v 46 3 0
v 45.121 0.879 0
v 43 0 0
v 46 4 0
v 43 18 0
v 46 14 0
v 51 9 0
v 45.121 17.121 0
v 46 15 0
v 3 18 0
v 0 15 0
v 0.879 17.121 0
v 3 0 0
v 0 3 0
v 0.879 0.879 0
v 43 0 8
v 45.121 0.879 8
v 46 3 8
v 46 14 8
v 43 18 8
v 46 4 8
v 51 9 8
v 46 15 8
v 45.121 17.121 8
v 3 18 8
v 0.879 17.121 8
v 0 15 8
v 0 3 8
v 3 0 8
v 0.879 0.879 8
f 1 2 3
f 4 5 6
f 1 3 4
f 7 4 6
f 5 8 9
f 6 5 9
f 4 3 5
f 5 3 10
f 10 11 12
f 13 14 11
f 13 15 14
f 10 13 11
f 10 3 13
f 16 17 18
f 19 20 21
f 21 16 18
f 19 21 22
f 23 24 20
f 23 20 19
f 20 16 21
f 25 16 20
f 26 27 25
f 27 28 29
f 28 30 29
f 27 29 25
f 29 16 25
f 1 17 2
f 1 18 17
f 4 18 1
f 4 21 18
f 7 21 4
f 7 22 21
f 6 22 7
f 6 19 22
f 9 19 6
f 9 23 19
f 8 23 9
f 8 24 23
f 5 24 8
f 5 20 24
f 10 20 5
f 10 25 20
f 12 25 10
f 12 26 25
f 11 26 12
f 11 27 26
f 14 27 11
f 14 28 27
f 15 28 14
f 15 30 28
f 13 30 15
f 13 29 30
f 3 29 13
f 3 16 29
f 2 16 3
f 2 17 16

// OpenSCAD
$fn = 32;

// ----------------------------------------------------------------------
// Ratchet pawl: 46 x 18 mm body, beak 5 mm с правого торца
// ----------------------------------------------------------------------

// --- parameters (mm) ---
profile_height = 8;       // extrusion height
profile_points = 15;      // points of the closed outline

profile = [[0, 3], [0.879, 0.879], [3, 0], [43, 0], [45.121, 0.879], [46, 3], [46, 4], [51, 9], [46, 14], [46, 15], [45.121, 17.121], [43, 18], [3, 18], [0.879, 17.121], [0, 15]];  // single closed polygon, 15 points, counter clockwise

// --- the one profile operation ---
linear_extrude(height = profile_height) polygon(points = profile);
